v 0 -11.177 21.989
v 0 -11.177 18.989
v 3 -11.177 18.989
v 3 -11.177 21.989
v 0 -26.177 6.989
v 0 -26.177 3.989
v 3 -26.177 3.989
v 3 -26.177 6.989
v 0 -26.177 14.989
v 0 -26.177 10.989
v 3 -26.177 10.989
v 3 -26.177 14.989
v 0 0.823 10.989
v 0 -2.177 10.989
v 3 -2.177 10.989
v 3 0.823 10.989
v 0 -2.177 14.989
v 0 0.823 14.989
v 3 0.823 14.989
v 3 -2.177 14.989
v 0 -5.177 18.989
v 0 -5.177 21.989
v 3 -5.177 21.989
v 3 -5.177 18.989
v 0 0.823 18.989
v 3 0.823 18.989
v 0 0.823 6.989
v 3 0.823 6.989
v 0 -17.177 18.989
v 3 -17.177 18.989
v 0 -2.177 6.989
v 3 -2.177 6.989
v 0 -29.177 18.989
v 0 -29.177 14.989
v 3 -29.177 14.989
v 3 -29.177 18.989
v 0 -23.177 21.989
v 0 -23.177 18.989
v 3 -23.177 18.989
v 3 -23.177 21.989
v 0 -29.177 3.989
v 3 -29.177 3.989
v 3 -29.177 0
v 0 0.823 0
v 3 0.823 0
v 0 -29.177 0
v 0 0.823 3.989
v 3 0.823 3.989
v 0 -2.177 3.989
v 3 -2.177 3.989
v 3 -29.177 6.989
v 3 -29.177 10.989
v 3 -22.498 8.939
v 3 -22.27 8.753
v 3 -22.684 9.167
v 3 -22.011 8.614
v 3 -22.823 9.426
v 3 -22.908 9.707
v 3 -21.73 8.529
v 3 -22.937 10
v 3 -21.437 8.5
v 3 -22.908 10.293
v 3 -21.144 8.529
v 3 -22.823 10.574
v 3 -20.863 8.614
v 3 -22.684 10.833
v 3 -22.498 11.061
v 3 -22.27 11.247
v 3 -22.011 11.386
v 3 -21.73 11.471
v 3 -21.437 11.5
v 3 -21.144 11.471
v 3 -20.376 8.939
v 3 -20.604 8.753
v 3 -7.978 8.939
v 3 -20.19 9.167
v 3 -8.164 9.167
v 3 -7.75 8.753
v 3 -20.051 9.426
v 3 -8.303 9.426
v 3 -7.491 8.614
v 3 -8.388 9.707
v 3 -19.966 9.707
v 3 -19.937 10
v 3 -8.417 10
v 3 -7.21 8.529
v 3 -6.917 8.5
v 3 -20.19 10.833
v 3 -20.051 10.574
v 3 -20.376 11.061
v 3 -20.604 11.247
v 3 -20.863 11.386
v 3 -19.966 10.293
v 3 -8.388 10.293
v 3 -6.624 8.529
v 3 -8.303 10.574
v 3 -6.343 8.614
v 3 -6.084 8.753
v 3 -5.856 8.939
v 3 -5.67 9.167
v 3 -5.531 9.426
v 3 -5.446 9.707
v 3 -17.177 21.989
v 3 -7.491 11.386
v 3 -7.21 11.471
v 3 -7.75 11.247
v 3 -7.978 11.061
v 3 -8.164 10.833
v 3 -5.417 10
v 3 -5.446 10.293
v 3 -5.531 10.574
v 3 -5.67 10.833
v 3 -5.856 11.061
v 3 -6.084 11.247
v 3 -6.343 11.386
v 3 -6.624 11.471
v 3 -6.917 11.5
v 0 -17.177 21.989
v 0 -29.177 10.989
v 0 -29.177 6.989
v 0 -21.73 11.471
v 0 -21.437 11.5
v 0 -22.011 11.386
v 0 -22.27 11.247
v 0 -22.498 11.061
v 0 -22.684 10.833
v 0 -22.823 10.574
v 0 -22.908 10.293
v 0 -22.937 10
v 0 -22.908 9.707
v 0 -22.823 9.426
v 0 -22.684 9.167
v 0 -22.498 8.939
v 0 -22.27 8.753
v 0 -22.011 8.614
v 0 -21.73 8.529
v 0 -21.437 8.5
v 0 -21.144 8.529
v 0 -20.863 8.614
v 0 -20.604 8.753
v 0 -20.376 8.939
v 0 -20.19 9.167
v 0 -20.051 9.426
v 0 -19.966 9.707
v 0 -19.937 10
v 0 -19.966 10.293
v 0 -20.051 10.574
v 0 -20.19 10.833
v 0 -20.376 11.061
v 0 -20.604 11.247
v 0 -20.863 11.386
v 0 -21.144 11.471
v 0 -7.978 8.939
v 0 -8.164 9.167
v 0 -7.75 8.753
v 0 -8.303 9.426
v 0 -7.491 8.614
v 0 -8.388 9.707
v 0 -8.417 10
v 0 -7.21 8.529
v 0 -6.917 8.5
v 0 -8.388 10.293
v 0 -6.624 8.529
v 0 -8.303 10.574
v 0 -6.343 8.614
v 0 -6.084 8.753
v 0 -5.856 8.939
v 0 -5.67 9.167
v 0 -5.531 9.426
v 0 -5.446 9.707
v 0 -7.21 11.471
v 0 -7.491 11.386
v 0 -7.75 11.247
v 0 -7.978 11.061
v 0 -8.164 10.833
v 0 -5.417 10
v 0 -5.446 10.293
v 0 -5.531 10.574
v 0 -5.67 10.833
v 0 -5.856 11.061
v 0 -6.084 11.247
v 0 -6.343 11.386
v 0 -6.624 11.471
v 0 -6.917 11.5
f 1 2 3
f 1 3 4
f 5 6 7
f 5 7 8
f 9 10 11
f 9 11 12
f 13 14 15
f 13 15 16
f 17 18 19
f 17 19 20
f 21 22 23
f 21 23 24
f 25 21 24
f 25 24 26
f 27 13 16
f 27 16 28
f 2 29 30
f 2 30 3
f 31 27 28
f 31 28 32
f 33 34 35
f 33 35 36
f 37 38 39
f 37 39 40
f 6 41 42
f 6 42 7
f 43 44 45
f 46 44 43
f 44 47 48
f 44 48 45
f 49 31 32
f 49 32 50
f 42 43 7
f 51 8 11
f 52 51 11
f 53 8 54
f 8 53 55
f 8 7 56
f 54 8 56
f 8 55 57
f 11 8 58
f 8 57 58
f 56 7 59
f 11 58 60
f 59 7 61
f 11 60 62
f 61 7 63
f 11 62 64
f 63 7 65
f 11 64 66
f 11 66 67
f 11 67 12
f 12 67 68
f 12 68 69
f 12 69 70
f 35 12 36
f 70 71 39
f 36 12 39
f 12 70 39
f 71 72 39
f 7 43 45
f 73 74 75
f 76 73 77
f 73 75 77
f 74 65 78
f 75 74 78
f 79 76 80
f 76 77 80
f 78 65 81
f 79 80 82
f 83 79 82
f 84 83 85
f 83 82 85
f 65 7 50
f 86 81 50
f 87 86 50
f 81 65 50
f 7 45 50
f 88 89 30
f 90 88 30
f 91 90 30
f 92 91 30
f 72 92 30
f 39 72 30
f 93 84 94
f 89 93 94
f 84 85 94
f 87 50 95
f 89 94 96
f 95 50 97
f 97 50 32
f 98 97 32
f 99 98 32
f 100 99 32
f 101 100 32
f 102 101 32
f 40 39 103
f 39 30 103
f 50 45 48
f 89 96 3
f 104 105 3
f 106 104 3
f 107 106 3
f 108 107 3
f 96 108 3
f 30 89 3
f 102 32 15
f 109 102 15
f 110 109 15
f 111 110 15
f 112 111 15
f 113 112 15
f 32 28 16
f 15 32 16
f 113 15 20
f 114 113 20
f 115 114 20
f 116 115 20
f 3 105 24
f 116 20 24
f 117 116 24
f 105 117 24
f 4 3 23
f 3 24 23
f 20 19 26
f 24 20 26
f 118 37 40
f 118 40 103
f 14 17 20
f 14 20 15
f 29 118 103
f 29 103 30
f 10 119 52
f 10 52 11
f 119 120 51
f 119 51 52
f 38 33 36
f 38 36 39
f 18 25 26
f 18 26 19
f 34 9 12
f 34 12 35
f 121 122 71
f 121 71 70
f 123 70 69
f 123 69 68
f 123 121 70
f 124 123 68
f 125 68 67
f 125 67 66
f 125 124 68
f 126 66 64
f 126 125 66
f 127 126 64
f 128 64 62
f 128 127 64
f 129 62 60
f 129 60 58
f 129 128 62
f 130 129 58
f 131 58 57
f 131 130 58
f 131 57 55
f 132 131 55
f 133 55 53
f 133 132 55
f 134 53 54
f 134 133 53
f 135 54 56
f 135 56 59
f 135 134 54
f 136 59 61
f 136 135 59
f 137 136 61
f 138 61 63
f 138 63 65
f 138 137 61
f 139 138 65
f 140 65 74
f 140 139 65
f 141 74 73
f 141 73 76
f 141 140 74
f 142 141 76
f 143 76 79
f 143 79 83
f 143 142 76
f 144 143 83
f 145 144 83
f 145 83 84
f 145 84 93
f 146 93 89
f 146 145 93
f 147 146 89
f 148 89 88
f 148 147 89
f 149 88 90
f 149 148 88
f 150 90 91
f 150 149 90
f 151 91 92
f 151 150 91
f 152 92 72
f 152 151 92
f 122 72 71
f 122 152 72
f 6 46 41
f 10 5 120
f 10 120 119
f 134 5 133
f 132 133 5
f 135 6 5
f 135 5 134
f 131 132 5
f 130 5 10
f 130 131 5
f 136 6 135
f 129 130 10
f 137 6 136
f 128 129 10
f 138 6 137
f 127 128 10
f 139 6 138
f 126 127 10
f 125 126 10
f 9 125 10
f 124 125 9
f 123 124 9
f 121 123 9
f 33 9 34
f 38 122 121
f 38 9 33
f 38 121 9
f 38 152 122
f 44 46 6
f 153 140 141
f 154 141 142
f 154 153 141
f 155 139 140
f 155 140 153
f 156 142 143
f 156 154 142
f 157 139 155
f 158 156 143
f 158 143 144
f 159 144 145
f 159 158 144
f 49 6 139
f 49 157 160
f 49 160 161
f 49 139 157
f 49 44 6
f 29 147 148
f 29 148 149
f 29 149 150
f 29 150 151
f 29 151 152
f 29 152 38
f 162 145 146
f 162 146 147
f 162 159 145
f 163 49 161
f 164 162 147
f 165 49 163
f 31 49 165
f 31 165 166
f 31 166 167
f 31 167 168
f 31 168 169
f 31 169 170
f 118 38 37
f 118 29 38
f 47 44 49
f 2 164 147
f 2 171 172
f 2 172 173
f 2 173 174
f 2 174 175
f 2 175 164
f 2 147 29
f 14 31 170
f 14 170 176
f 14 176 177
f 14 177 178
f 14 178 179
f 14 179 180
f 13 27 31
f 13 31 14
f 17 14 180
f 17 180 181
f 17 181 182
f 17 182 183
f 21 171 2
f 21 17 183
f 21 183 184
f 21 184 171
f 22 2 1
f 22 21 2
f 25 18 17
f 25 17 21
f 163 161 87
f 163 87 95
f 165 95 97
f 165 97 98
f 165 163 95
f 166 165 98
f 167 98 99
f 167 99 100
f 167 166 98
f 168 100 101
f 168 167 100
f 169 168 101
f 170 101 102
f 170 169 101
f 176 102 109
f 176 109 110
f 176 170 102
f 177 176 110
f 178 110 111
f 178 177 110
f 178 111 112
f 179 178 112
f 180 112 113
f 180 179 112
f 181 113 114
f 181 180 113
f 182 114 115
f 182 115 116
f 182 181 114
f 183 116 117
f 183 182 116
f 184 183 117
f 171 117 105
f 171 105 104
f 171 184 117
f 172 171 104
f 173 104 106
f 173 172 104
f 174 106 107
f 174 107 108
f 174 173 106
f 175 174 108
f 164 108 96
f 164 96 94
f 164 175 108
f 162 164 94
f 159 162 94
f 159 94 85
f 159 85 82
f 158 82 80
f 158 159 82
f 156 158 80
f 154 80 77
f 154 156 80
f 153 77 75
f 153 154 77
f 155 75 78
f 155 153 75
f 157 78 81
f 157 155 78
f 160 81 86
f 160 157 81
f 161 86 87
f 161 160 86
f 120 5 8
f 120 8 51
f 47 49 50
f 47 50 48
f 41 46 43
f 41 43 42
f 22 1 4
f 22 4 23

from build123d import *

# Parameters (mm, degrees)
SKETCH1_R           = 1.5
BOSS_EXTRUDE1_DEPTH = 3


with BuildPart() as part:
    # Sketch1 → Boss-Extrude1 (new body)
    with BuildSketch(Plane(origin=(0, 0, 0), x_dir=(0, 0, -1), z_dir=(1, 0, 0))):
        Polygon((0, -29.177050279), (-3.988546489, -29.177050279), (-3.988546489, -26.177050279), (-6.988546489, -26.177050279), (-6.988546489, -29.177050279), (-10.988546489, -29.177050279), (-10.988546489, -26.177050279), (-14.988546489, -26.177050279), (-14.988546489, -29.177050279), (-18.988546489, -29.177050279), (-18.988546489, -23.177050279), (-21.988546489, -23.177050279), (-21.988546489, -17.177050279), (-18.988546489, -17.177050279), (-18.988546489, -11.177050279), (-21.988546489, -11.177050279), (-21.988546489, -5.177050279), (-18.988546489, -5.177050279), (-18.988546489, 0.822949721), (-14.988546489, 0.822949721), (-14.988546489, -2.177050279), (-10.988546489, -2.177050279), (-10.988546489, 0.822949721), (-6.988546489, 0.822949721), (-6.988546489, -2.177050279), (-3.988546489, -2.177050279), (-3.988546489, 0.822949721), (0, 0.822949721), align=None)
        with Locations((-10, -6.917050279)):
            Circle(SKETCH1_R, mode=Mode.SUBTRACT)
        with Locations(Location((-10, -21.437050279, 0), (0, 0, 180))):
            Circle(SKETCH1_R, mode=Mode.SUBTRACT)
    extrude(amount=BOSS_EXTRUDE1_DEPTH)


solid = part.part
